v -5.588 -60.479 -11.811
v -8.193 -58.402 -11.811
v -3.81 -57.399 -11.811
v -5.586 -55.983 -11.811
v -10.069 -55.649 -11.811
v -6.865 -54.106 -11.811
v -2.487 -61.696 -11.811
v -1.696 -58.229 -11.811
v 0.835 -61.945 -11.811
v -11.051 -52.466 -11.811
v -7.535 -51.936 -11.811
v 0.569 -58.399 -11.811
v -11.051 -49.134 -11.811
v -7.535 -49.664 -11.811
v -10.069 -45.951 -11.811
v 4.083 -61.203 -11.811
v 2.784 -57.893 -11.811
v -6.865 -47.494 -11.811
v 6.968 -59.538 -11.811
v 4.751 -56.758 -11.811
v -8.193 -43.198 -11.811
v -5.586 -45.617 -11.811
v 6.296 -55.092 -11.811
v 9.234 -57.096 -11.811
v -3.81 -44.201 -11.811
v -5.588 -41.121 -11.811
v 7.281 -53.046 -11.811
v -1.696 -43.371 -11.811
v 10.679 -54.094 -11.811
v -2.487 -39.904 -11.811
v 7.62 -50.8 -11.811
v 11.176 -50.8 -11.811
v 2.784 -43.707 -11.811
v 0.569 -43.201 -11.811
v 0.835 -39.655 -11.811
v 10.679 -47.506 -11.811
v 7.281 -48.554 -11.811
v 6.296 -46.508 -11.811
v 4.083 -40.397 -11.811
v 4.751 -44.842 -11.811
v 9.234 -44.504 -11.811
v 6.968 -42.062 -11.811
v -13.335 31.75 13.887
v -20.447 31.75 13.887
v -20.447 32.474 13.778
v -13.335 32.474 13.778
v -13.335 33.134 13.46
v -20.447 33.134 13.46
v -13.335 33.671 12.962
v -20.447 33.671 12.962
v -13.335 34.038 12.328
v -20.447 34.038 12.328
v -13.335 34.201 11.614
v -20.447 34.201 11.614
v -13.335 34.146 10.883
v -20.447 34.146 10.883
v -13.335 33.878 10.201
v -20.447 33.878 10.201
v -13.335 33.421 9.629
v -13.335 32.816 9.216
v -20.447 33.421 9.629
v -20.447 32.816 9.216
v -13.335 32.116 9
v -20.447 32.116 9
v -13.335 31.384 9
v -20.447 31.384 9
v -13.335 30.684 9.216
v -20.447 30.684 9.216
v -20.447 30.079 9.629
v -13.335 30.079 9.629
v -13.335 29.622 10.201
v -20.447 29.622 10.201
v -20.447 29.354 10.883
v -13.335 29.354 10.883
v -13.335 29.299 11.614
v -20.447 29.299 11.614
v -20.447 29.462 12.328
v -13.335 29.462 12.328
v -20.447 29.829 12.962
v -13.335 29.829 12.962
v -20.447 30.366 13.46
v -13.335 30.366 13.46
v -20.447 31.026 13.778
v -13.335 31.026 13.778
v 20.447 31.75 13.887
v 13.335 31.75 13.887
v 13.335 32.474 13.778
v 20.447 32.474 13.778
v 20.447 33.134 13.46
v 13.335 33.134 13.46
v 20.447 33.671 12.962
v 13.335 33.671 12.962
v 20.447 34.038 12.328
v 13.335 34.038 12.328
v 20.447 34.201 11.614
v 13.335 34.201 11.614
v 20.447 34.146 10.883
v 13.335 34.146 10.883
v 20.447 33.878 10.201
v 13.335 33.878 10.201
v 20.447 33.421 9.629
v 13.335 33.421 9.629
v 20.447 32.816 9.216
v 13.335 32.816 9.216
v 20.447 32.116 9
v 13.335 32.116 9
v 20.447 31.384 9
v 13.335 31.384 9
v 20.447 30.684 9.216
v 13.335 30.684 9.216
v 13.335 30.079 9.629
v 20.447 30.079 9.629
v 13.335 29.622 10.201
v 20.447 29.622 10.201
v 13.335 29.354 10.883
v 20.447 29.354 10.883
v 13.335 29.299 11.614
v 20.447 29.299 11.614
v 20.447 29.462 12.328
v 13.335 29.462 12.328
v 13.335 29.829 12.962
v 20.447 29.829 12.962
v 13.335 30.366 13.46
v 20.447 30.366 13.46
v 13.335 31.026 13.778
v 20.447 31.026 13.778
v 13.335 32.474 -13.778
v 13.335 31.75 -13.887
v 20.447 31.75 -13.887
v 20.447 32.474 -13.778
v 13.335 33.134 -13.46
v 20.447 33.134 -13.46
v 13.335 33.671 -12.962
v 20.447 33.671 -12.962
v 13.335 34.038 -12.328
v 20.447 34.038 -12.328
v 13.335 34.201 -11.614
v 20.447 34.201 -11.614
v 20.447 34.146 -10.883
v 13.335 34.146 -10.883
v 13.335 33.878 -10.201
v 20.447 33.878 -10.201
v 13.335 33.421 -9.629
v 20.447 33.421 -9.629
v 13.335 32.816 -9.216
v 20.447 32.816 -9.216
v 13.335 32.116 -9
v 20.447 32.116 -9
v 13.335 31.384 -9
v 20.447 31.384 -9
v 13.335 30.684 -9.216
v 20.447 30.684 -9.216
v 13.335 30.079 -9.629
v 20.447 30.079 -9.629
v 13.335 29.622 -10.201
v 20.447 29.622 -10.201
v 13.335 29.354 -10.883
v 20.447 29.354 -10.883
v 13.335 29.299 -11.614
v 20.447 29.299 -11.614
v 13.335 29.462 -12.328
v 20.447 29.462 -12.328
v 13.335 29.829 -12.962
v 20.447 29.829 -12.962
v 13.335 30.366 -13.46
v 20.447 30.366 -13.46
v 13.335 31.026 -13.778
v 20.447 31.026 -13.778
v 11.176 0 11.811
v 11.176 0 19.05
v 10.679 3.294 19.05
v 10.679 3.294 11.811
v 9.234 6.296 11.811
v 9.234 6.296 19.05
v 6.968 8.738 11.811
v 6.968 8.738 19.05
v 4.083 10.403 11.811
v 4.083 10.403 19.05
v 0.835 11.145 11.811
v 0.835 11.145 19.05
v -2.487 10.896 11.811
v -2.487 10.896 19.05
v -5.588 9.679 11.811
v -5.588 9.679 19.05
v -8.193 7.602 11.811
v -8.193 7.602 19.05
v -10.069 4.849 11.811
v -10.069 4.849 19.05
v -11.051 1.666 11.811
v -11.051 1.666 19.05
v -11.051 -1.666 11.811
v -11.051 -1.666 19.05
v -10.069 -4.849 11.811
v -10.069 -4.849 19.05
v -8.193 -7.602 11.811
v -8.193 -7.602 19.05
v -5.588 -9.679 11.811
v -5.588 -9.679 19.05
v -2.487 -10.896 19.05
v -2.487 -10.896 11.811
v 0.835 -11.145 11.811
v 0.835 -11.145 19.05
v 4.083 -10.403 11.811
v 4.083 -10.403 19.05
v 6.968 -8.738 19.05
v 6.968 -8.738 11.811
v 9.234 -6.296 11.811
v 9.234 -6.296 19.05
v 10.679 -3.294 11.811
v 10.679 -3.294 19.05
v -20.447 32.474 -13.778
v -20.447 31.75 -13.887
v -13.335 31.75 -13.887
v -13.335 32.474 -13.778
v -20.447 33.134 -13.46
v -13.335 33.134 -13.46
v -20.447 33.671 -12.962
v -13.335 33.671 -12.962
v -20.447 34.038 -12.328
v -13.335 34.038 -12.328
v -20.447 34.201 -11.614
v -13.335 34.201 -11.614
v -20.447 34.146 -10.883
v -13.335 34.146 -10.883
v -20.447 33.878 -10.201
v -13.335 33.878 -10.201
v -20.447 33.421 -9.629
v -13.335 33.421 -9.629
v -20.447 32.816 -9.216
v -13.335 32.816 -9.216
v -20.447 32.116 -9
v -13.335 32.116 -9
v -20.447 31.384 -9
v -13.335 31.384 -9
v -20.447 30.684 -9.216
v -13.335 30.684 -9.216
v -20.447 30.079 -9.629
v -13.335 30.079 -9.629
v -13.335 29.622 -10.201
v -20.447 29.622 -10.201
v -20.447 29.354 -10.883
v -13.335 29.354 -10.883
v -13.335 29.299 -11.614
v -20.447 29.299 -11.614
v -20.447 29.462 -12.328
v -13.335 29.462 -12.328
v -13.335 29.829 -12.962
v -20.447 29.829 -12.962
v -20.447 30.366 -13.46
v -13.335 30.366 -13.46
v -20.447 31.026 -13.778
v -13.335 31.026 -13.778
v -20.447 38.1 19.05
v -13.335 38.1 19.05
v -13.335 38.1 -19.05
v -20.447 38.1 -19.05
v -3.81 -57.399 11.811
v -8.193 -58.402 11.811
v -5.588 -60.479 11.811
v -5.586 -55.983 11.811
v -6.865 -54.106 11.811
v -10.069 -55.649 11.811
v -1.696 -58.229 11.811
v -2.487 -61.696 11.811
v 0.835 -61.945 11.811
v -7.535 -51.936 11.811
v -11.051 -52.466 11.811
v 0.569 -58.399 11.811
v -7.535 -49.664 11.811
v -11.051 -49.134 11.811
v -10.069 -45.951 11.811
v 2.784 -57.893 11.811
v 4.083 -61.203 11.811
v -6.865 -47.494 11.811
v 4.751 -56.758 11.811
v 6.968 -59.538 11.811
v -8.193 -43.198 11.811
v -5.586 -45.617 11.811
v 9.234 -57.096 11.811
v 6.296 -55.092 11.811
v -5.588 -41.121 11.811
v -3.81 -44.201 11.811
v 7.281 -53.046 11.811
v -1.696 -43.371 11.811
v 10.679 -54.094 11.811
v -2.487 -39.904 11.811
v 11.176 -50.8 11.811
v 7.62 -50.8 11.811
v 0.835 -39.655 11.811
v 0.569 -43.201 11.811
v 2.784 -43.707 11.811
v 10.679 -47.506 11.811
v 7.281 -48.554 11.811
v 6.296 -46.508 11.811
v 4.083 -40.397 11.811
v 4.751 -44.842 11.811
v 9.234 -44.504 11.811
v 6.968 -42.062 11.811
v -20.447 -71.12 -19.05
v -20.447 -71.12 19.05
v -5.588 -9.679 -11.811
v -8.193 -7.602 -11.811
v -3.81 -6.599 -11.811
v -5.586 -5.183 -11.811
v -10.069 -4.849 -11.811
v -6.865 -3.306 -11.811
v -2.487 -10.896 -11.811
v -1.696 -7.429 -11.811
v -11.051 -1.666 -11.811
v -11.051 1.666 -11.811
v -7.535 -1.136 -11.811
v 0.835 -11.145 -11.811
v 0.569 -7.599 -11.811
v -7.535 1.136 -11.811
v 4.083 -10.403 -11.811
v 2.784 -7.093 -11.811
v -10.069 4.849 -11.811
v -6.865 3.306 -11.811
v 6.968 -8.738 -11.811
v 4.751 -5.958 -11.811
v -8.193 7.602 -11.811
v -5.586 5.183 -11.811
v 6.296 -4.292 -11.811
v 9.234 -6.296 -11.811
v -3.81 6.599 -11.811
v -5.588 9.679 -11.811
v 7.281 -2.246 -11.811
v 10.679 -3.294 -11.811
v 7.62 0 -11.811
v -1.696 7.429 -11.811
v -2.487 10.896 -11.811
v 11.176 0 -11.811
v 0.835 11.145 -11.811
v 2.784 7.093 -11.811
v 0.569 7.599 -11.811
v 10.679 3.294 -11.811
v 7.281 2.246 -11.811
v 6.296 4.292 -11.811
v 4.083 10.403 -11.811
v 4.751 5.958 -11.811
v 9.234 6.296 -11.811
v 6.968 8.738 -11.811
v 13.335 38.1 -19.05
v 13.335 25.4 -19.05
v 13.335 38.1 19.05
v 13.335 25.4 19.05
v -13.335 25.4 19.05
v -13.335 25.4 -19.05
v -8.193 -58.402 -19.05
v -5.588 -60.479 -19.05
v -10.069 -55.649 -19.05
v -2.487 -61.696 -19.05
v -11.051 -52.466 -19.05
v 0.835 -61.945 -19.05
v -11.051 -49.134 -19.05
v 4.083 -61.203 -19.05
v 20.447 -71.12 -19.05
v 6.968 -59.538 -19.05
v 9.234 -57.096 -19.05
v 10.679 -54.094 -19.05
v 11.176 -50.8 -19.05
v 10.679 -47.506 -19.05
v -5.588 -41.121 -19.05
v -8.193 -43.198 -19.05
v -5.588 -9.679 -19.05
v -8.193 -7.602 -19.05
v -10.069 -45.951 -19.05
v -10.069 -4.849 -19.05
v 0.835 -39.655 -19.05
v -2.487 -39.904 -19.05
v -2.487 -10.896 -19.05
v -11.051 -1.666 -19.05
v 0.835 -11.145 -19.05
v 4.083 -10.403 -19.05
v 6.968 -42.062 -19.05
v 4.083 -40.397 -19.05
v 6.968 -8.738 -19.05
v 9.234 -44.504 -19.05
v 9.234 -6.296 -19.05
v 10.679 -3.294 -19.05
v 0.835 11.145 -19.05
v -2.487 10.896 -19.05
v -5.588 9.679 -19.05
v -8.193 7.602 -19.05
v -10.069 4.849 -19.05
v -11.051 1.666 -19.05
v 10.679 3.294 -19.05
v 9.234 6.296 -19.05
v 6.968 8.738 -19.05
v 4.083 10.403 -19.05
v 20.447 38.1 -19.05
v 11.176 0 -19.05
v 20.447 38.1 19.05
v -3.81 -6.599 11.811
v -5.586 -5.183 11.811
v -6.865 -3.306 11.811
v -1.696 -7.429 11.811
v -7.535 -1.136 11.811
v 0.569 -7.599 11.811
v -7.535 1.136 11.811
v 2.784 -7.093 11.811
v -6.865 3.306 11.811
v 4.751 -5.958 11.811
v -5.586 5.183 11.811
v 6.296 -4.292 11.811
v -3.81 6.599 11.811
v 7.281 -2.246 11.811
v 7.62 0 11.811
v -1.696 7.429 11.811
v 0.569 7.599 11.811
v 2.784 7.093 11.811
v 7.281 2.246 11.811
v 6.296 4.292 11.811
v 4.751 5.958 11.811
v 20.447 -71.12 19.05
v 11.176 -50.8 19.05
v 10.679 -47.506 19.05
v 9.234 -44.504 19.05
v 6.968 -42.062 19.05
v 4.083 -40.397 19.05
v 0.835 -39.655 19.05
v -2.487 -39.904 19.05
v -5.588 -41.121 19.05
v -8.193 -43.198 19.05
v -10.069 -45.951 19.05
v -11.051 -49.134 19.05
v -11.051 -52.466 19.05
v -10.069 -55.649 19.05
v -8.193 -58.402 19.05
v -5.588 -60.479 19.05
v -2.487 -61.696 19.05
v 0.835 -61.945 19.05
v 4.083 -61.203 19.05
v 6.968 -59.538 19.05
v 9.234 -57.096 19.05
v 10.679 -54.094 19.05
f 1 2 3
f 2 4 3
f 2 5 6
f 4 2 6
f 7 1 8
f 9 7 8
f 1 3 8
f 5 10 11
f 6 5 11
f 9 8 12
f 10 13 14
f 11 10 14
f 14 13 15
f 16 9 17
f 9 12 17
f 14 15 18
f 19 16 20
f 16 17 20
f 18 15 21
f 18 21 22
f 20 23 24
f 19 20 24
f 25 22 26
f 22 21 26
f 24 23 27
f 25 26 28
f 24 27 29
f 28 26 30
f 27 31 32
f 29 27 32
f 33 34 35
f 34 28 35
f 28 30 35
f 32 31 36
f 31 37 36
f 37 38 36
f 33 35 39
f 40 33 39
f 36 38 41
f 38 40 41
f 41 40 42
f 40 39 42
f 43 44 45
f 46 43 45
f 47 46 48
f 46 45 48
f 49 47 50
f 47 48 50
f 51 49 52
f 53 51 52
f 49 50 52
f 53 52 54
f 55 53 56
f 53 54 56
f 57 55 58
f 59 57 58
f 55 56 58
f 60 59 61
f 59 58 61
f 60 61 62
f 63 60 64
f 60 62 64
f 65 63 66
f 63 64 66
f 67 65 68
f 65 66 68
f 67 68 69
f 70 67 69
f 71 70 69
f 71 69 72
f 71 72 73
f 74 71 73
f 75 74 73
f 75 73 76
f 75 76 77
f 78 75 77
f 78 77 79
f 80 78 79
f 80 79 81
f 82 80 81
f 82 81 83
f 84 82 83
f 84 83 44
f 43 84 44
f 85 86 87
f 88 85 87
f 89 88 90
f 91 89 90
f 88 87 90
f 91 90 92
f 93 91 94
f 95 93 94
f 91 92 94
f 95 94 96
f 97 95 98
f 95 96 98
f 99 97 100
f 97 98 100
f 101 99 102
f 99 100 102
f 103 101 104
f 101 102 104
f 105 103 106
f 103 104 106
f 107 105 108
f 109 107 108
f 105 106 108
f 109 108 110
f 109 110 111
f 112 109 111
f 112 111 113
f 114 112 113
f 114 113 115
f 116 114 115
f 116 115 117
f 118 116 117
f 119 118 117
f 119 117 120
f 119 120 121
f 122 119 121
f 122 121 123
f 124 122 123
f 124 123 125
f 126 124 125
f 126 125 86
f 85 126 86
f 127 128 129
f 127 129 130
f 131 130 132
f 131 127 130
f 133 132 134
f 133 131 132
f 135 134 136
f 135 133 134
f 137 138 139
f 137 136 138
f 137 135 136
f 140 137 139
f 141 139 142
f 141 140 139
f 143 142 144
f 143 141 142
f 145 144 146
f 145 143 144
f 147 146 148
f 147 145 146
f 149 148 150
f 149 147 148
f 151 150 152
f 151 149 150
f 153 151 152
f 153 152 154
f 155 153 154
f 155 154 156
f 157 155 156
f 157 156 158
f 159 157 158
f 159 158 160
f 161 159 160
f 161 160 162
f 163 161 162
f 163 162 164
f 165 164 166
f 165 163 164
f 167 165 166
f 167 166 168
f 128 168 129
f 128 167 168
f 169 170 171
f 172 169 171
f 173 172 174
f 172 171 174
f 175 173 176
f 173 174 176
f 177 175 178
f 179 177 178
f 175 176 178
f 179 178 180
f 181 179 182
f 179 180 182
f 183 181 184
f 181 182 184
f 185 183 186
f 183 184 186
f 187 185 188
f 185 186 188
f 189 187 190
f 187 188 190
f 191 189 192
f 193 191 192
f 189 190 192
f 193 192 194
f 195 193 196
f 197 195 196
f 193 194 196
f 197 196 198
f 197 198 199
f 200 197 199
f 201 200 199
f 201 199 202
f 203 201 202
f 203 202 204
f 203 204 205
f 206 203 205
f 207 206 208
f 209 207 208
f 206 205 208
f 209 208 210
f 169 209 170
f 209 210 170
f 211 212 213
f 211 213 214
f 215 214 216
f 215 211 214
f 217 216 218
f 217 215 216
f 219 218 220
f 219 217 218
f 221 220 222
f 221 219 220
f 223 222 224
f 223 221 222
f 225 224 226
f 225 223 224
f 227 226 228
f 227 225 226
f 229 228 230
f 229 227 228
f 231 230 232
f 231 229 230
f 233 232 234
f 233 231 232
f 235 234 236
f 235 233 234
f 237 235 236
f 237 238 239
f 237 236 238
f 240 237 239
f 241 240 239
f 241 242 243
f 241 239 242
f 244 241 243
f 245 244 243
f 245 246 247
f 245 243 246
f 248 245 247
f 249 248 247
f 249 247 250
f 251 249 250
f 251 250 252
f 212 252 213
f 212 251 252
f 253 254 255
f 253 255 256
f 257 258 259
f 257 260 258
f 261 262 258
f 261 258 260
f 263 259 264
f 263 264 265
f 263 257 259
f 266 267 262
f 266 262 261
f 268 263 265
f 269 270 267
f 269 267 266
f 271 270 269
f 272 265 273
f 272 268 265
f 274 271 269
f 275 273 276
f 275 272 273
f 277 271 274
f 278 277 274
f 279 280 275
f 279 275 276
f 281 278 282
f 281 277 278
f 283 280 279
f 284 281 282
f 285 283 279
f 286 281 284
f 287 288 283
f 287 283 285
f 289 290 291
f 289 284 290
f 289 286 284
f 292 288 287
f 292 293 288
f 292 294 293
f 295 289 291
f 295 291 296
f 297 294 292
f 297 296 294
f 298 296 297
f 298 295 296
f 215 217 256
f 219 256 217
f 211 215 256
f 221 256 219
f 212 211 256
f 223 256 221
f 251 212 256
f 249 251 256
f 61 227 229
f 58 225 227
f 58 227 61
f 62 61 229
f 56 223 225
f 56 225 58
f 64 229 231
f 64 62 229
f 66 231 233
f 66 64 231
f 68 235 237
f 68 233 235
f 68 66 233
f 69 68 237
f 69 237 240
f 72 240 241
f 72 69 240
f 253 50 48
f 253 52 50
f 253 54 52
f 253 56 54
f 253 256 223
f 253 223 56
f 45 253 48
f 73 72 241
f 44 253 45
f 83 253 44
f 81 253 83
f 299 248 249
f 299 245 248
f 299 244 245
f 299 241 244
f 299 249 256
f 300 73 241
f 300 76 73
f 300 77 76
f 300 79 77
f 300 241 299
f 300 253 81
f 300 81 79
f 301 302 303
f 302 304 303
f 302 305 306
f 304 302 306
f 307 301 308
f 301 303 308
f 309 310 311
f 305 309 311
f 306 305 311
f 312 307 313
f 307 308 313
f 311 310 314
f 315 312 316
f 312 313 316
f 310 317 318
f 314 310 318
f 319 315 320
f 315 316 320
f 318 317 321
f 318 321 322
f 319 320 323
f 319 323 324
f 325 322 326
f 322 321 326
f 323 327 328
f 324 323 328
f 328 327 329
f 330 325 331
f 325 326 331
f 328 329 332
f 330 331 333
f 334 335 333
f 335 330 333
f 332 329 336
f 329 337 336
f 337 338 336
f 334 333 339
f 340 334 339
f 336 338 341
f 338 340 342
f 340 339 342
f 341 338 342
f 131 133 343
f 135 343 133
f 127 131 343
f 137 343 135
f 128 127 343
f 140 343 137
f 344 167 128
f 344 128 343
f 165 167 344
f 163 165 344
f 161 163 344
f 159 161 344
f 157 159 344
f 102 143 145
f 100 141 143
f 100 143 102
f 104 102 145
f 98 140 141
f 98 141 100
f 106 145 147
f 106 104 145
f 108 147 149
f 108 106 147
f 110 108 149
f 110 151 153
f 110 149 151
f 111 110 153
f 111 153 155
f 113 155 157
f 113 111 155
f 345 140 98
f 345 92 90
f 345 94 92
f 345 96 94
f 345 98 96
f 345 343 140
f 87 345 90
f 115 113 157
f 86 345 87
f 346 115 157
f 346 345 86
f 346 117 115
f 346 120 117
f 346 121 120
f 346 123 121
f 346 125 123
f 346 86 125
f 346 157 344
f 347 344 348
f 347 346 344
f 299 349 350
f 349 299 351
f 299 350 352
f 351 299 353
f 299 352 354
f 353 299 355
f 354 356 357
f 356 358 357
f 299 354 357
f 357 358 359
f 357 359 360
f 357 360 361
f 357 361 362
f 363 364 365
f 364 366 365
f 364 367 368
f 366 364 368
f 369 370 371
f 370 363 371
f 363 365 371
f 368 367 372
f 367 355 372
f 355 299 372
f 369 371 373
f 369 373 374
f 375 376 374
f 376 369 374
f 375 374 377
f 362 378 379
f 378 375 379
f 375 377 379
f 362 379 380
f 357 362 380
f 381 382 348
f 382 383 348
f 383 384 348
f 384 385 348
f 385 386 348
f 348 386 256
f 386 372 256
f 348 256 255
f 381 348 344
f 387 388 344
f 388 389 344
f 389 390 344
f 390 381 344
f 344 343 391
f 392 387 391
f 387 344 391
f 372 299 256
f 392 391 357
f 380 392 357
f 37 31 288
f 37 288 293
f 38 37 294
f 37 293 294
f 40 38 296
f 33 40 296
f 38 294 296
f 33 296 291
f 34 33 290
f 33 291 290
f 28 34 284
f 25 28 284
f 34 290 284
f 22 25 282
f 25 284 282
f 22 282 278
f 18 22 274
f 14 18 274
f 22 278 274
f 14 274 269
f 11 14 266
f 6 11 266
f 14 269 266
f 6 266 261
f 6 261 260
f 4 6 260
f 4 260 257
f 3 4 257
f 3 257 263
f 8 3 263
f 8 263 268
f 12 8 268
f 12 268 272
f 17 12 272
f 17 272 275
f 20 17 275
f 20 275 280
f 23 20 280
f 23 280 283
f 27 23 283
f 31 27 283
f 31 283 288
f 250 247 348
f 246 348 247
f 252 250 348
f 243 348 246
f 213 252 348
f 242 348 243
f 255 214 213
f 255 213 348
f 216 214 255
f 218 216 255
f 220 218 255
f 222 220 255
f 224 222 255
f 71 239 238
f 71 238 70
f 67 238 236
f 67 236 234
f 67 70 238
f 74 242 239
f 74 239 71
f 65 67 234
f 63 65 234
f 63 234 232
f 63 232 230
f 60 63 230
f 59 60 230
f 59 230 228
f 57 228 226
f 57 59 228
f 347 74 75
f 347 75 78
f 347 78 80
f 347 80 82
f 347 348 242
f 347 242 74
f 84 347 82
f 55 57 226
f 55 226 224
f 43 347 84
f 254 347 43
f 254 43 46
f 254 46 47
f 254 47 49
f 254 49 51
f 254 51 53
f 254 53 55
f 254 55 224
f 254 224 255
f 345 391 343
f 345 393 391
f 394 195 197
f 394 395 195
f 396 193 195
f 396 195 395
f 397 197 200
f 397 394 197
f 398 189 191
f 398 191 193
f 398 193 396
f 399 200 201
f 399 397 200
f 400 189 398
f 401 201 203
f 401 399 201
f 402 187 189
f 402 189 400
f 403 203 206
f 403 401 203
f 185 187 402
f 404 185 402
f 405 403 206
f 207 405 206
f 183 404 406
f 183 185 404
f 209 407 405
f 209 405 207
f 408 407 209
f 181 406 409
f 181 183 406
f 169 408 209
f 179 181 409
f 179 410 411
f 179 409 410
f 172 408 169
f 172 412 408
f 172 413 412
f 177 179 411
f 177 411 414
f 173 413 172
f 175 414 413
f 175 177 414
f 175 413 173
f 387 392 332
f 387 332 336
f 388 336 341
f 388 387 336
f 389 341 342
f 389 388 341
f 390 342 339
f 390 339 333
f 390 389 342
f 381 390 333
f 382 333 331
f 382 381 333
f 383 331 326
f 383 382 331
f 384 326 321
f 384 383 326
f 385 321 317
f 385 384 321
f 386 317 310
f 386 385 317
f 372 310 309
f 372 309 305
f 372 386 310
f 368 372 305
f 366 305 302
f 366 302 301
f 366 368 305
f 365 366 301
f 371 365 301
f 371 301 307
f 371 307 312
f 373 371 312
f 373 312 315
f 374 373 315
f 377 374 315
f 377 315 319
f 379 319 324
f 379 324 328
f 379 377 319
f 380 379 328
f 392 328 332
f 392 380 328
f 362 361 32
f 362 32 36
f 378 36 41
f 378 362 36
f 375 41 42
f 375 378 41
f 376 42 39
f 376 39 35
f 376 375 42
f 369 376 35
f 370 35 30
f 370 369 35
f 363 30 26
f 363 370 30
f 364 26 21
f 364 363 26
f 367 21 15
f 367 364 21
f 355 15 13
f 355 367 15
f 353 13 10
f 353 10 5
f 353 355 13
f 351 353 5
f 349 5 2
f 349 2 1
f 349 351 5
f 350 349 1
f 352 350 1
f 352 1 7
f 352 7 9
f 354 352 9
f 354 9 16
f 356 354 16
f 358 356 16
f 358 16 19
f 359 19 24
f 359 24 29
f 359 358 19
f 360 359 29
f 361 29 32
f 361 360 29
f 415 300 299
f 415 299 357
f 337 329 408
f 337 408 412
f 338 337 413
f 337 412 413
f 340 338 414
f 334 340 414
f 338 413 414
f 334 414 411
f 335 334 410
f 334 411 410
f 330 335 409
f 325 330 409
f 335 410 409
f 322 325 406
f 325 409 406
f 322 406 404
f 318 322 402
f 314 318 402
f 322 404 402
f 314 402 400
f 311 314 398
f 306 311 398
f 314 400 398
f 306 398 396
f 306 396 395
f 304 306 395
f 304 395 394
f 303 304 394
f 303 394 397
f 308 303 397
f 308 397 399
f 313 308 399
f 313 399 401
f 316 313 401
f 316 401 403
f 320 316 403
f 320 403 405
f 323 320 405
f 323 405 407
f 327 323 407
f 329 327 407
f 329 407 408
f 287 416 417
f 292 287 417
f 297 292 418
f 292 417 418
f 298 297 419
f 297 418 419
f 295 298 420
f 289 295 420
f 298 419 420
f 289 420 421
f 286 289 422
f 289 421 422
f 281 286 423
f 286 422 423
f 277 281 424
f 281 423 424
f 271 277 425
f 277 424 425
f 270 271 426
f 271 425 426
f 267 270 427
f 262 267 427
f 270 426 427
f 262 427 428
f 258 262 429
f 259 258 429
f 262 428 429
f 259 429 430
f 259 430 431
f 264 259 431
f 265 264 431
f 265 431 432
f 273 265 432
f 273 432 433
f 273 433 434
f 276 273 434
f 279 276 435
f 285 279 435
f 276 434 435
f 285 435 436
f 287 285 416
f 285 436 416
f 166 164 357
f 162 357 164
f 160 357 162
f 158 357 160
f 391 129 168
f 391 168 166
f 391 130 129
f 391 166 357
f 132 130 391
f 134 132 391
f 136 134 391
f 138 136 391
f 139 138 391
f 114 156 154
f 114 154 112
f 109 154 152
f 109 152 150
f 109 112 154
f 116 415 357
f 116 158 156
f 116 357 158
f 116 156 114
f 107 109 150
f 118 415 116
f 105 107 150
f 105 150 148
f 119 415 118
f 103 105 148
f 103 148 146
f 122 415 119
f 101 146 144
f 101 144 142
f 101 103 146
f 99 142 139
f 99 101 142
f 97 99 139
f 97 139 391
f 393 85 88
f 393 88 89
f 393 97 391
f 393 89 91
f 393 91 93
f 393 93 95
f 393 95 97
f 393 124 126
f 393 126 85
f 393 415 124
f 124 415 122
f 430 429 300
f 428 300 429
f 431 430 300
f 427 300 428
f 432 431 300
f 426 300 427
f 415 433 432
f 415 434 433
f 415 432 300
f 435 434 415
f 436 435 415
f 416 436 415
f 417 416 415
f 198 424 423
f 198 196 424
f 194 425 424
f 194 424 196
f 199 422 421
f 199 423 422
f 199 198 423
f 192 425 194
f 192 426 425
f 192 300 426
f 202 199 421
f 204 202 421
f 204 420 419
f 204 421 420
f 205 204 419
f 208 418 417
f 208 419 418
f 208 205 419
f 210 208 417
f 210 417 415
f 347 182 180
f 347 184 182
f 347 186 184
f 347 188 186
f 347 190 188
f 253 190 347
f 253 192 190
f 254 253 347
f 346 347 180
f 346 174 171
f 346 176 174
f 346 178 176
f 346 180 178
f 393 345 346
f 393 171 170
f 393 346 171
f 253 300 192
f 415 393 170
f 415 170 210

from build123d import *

# Parameters (mm, degrees)
BOSS_EXTRUDE1_DEPTH          = 19.05
SKETCH7_R                    = 7.62
CUT_EXTRUDE2_DEPTH           = 38.1
SKETCH2_R                    = 11.176
CUT_EXTRUDE1_DEPTH           = 7.239
SKETCH8_R                    = 11.176
CUT_EXTRUDE3_DEPTH           = 7.239
F_10_0_1935_DIAMETER_HOLE1_D = 4.9149


with BuildPart() as part:
    # Sketch1 → Boss-Extrude1 (new body, symmetric)
    with BuildSketch(Plane.XY):
        Polygon((13.335, 25.4), (-13.335, 25.4), (-13.335, 38.1), (-20.447, 38.1), (-20.447, -71.12), (20.447, -71.12), (20.447, 38.1), (13.335, 38.1), align=None)
    extrude(amount=BOSS_EXTRUDE1_DEPTH, both=True)

    # Sketch7 → Cut-Extrude2 (cut)
    with BuildSketch(Plane.XY.offset(19.05)):
        Circle(SKETCH7_R)
        with Locations((0, -50.8)):
            Circle(SKETCH7_R)
    extrude(amount=-CUT_EXTRUDE2_DEPTH, mode=Mode.SUBTRACT)

    # Sketch2 → Cut-Extrude1 (cut)
    with BuildSketch(Plane.XY.offset(19.05)):
        Circle(SKETCH2_R)
        with Locations((0, -50.8)):
            Circle(SKETCH2_R)
    extrude(amount=-CUT_EXTRUDE1_DEPTH, mode=Mode.SUBTRACT)

    # Sketch8 → Cut-Extrude3 (cut)
    with BuildSketch(Plane.XY.offset(-19.05)):
        Circle(SKETCH8_R)
        with Locations((0, -50.8)):
            Circle(SKETCH8_R)
    extrude(amount=CUT_EXTRUDE3_DEPTH, mode=Mode.SUBTRACT)

    # #10 (0.1935) Diameter Hole1 (through all)
    with Locations(Plane(origin=(20.447, 0, 0), x_dir=(0, 0, -1), z_dir=(1, 0, 0))):
        with Locations((-11.43, 31.75)):
            f_10_0_1935_diameter_hole1 = Hole(F_10_0_1935_DIAMETER_HOLE1_D / 2)

    # Mirror1: #10 (0.1935) Diameter Hole1 across plane
    add(f_10_0_1935_diameter_hole1.mirror(Plane.XY), mode=Mode.SUBTRACT)


solid = part.part
